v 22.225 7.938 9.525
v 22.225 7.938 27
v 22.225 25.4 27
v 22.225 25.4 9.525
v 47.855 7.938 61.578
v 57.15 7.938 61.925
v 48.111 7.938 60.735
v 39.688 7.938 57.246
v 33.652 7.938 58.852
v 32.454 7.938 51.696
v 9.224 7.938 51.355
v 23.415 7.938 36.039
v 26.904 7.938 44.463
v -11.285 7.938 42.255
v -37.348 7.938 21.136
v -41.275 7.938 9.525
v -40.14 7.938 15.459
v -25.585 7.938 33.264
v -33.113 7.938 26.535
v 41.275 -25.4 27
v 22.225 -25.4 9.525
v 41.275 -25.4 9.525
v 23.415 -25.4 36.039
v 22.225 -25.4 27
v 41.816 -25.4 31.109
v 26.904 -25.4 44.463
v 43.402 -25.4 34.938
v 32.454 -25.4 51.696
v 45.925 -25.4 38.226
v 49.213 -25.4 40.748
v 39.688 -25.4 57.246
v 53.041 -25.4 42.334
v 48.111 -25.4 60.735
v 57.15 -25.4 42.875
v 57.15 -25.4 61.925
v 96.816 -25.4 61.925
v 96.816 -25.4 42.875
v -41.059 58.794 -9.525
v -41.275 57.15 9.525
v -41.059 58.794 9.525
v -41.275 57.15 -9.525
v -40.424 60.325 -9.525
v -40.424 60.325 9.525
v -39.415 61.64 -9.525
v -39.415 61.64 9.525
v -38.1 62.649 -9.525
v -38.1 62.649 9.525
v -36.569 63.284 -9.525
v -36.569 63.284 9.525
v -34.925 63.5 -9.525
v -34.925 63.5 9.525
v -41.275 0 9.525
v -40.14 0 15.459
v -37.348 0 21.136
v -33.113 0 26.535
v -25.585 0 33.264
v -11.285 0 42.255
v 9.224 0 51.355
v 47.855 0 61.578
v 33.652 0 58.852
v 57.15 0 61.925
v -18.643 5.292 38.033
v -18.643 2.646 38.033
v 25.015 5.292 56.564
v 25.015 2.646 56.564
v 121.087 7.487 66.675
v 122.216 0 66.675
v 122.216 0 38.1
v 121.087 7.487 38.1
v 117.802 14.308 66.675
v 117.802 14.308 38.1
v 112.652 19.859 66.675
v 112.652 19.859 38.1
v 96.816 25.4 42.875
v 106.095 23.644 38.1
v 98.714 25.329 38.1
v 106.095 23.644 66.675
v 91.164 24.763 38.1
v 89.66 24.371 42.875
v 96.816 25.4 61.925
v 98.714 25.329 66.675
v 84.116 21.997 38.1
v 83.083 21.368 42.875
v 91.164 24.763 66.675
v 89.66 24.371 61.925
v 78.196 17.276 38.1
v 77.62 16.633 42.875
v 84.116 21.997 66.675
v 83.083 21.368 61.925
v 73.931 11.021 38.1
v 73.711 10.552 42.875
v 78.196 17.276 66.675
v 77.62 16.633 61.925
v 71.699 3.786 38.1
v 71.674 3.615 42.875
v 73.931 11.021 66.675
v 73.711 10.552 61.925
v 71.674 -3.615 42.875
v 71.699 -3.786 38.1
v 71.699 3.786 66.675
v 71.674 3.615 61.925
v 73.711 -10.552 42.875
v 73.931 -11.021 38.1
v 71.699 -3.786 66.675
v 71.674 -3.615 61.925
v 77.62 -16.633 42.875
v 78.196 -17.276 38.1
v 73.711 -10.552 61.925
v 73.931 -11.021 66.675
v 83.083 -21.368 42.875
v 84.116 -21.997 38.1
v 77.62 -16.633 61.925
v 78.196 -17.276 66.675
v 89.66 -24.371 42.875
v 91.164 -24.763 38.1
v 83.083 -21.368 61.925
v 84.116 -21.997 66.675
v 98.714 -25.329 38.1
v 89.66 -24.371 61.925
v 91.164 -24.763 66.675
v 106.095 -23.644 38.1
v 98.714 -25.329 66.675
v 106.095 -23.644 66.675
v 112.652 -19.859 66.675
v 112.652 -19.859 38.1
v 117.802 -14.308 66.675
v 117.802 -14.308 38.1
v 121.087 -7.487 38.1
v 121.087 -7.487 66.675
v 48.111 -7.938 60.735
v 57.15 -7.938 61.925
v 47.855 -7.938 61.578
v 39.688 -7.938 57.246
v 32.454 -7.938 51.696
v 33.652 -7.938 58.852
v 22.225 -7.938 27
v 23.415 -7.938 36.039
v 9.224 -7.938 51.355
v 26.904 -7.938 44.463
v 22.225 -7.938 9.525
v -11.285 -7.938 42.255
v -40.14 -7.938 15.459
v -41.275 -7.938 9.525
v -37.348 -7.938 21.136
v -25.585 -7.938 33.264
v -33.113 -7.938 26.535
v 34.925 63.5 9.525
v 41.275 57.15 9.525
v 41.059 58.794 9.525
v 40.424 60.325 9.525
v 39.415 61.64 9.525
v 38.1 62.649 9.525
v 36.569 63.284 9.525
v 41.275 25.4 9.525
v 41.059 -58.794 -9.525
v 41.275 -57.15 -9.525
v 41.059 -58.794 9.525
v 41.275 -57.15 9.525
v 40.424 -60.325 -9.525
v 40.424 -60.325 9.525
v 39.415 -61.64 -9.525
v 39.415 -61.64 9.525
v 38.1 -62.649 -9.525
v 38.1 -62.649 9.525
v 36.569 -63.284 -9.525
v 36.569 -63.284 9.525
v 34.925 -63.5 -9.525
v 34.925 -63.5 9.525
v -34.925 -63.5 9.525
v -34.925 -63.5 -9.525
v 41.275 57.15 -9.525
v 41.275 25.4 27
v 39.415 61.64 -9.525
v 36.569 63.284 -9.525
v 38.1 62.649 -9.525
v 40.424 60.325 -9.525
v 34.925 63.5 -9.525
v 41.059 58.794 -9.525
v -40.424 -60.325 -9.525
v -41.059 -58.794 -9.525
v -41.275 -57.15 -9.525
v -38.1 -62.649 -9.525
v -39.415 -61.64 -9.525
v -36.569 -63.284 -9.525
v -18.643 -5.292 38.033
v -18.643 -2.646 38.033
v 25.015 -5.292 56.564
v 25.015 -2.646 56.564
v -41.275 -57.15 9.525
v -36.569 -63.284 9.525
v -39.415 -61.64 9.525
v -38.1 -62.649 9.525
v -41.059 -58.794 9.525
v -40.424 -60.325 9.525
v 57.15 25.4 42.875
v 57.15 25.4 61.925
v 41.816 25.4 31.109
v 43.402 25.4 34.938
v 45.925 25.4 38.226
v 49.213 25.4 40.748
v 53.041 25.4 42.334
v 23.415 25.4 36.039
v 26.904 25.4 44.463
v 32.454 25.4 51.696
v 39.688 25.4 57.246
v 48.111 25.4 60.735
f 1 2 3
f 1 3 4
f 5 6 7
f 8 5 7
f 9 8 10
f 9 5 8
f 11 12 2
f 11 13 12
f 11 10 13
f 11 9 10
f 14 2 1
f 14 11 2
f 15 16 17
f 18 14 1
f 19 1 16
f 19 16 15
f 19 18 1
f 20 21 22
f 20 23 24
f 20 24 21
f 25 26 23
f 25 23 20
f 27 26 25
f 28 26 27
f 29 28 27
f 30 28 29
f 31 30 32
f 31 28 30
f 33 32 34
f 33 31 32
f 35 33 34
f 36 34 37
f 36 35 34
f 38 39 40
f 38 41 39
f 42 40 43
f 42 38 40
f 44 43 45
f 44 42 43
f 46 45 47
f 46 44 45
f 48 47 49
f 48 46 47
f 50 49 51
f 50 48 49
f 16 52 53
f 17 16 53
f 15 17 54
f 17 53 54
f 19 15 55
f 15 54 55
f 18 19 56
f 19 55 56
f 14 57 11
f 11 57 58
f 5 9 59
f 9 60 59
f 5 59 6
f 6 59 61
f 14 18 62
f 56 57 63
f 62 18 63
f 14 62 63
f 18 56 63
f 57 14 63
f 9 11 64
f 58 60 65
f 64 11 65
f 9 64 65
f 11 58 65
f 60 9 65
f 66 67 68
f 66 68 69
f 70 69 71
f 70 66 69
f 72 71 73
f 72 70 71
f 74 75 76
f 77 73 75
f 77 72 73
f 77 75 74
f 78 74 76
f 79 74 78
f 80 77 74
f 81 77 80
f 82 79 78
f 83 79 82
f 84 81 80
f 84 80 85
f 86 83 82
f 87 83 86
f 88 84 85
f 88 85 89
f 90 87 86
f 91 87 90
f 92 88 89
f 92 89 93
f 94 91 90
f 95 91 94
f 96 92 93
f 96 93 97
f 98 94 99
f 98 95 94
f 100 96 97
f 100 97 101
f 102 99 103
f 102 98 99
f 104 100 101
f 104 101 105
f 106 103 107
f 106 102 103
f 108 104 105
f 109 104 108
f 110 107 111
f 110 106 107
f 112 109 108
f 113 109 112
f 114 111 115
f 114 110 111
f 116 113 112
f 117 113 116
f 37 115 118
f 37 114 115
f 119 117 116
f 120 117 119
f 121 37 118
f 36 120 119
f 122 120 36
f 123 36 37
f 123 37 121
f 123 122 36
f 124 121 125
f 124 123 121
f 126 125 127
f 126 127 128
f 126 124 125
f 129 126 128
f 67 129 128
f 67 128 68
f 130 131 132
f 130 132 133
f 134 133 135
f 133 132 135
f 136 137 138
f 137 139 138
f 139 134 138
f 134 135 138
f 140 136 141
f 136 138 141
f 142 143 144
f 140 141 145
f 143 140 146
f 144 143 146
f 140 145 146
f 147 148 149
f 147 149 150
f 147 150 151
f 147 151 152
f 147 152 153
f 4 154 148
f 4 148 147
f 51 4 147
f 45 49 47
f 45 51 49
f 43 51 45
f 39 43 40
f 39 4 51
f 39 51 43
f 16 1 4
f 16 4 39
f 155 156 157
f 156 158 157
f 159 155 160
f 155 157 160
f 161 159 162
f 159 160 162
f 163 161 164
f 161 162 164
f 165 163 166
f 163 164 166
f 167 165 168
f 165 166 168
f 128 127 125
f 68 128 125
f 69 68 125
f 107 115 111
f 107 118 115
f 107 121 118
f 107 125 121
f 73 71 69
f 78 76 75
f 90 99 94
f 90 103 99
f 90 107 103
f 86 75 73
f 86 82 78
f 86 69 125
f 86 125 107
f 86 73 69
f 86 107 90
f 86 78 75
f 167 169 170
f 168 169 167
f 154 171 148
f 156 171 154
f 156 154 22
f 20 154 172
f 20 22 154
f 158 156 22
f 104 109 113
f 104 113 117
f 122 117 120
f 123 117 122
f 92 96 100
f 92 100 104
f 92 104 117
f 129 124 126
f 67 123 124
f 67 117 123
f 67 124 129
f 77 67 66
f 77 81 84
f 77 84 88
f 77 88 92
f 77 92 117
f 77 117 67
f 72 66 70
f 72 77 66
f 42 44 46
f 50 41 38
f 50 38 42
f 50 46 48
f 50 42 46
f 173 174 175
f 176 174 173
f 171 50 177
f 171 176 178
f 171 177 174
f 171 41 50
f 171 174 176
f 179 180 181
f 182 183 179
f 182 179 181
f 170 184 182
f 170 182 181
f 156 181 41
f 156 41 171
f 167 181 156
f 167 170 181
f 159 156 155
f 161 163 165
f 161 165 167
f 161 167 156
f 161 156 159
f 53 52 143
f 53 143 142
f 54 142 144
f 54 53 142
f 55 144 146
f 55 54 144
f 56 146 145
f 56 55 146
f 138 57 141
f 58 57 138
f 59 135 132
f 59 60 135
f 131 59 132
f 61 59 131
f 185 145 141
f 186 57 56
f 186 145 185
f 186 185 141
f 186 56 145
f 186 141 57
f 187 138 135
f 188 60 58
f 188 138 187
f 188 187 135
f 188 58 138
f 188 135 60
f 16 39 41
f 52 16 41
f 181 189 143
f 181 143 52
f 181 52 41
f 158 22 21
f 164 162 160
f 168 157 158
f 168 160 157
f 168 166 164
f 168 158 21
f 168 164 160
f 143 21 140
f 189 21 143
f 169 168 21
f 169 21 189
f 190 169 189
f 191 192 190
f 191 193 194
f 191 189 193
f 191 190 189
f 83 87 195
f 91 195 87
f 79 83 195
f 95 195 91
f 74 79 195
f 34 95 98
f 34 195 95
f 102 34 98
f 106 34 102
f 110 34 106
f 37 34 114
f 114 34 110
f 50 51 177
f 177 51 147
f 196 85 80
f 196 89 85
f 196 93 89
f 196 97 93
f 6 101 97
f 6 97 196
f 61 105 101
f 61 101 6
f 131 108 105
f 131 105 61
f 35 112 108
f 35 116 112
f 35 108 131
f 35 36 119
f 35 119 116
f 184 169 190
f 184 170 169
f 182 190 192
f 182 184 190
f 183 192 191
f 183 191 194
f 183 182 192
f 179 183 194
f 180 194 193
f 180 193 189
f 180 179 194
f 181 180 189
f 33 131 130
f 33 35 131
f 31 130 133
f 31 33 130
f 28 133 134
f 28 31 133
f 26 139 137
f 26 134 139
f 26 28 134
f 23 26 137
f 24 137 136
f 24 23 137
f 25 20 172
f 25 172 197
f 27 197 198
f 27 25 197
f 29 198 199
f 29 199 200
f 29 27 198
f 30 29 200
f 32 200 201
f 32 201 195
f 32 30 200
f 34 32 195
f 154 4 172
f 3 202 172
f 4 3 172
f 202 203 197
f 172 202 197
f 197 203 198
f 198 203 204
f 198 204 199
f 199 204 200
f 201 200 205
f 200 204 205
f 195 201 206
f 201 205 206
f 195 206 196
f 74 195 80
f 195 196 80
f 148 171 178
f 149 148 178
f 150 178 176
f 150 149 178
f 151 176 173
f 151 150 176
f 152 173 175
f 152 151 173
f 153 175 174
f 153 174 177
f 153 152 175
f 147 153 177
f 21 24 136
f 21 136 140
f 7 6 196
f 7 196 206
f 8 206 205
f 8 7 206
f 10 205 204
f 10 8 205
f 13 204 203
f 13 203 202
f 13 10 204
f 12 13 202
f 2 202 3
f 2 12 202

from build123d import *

# Parameters (mm, degrees)
F1_DEPTH = 63.5
F2_DEPTH = 25.4
F3_DEPTH = 7.9375
F5_R     = 6.35


# Not quite as in the source:
# - ends of sketch curves that miss each other by under 0.0002 mm in the source are joined
# - a feature names something its author has since deleted; it is built from what else it names


with BuildPart() as f1:
    # F0 (on Front) → F1 (new body, symmetric)
    with BuildSketch(Plane.XZ):
        Polygon((-41.275, 9.525), (-41.275, -9.525), (41.275, -9.525), (41.275, 9.525), (22.225, 9.525), align=None)
    extrude(amount=F1_DEPTH, both=True)

    # F0 (on Front) → F2 (join, symmetric)
    with BuildSketch(Plane.XZ):
        with BuildLine():
            Line((22.225, 9.525), (41.275, 9.525))
            Line((41.275, 9.525), (41.275, 27.0002))
            ThreePointArc((41.275, 27.0002), (45.9246798487, 38.2255201513), (57.15, 42.8752))
            Line((57.15, 42.8752), (71.4156685244, 42.8752))
            Line((71.4156685244, 42.8752), (71.4156685244, 61.9252))
            Line((71.4156685244, 61.9252), (57.15, 61.9252))
            ThreePointArc((57.15, 61.9252), (32.4542956671, 51.6959043329), (22.225, 27.0002))
            Line((22.225, 27.0002), (22.225, 9.525))
        make_face()
        Polygon((96.8156695652, 61.9252), (71.4156685244, 61.9252), (71.4156685244, 42.8752), (96.8156754971, 42.8752), align=None)
    extrude(amount=F2_DEPTH, both=True)

    # F0 (on Front) → F3 (join, symmetric)
    with BuildSketch(Plane.XZ):
        with BuildLine():
            add(Edge.make_bspline(
                [(-41.275, 9.525), (-40.0072485209, 41.9578626752), (41.6273023615, 64.213483679), (57.15, 61.9252)],
                knots=[0, 0, 0, 0, 111.5045361635, 111.5045361635, 111.5045361635, 111.5045361635], degree=3))
            Line((-41.275, 9.525), (22.225, 9.525))
            Line((22.225, 9.525), (22.225, 27.0002))
            ThreePointArc((22.225, 27.0002), (32.4542956671, 51.6959043329), (57.15, 61.9252))
        make_face()
    extrude(amount=F3_DEPTH, both=True)

    # F0 (on Front) → F4 (revolve)
    with BuildSketch(Plane.XZ):
        Polygon((96.8156685244, 66.675), (96.8156685244, 61.9252), (96.8156685244, 42.8752), (96.8156685244, 38.1), (122.2156685244, 38.1), (122.2156685244, 66.675), align=None)
    revolve(axis=Axis((96.8156685244, 0, 52.3875), (0, 0, 1)))

    # F5
    f5_edges = [f1.edges().sort_by_distance(p)[0] for p in [
        (-41.275, -63.5, 0),
        (-41.275, 63.5, 0),
        (41.275, 63.5, 0),
        (41.275, -63.5, 0),
    ]]
    fillet(f5_edges, radius=F5_R)


solid = f1.part
